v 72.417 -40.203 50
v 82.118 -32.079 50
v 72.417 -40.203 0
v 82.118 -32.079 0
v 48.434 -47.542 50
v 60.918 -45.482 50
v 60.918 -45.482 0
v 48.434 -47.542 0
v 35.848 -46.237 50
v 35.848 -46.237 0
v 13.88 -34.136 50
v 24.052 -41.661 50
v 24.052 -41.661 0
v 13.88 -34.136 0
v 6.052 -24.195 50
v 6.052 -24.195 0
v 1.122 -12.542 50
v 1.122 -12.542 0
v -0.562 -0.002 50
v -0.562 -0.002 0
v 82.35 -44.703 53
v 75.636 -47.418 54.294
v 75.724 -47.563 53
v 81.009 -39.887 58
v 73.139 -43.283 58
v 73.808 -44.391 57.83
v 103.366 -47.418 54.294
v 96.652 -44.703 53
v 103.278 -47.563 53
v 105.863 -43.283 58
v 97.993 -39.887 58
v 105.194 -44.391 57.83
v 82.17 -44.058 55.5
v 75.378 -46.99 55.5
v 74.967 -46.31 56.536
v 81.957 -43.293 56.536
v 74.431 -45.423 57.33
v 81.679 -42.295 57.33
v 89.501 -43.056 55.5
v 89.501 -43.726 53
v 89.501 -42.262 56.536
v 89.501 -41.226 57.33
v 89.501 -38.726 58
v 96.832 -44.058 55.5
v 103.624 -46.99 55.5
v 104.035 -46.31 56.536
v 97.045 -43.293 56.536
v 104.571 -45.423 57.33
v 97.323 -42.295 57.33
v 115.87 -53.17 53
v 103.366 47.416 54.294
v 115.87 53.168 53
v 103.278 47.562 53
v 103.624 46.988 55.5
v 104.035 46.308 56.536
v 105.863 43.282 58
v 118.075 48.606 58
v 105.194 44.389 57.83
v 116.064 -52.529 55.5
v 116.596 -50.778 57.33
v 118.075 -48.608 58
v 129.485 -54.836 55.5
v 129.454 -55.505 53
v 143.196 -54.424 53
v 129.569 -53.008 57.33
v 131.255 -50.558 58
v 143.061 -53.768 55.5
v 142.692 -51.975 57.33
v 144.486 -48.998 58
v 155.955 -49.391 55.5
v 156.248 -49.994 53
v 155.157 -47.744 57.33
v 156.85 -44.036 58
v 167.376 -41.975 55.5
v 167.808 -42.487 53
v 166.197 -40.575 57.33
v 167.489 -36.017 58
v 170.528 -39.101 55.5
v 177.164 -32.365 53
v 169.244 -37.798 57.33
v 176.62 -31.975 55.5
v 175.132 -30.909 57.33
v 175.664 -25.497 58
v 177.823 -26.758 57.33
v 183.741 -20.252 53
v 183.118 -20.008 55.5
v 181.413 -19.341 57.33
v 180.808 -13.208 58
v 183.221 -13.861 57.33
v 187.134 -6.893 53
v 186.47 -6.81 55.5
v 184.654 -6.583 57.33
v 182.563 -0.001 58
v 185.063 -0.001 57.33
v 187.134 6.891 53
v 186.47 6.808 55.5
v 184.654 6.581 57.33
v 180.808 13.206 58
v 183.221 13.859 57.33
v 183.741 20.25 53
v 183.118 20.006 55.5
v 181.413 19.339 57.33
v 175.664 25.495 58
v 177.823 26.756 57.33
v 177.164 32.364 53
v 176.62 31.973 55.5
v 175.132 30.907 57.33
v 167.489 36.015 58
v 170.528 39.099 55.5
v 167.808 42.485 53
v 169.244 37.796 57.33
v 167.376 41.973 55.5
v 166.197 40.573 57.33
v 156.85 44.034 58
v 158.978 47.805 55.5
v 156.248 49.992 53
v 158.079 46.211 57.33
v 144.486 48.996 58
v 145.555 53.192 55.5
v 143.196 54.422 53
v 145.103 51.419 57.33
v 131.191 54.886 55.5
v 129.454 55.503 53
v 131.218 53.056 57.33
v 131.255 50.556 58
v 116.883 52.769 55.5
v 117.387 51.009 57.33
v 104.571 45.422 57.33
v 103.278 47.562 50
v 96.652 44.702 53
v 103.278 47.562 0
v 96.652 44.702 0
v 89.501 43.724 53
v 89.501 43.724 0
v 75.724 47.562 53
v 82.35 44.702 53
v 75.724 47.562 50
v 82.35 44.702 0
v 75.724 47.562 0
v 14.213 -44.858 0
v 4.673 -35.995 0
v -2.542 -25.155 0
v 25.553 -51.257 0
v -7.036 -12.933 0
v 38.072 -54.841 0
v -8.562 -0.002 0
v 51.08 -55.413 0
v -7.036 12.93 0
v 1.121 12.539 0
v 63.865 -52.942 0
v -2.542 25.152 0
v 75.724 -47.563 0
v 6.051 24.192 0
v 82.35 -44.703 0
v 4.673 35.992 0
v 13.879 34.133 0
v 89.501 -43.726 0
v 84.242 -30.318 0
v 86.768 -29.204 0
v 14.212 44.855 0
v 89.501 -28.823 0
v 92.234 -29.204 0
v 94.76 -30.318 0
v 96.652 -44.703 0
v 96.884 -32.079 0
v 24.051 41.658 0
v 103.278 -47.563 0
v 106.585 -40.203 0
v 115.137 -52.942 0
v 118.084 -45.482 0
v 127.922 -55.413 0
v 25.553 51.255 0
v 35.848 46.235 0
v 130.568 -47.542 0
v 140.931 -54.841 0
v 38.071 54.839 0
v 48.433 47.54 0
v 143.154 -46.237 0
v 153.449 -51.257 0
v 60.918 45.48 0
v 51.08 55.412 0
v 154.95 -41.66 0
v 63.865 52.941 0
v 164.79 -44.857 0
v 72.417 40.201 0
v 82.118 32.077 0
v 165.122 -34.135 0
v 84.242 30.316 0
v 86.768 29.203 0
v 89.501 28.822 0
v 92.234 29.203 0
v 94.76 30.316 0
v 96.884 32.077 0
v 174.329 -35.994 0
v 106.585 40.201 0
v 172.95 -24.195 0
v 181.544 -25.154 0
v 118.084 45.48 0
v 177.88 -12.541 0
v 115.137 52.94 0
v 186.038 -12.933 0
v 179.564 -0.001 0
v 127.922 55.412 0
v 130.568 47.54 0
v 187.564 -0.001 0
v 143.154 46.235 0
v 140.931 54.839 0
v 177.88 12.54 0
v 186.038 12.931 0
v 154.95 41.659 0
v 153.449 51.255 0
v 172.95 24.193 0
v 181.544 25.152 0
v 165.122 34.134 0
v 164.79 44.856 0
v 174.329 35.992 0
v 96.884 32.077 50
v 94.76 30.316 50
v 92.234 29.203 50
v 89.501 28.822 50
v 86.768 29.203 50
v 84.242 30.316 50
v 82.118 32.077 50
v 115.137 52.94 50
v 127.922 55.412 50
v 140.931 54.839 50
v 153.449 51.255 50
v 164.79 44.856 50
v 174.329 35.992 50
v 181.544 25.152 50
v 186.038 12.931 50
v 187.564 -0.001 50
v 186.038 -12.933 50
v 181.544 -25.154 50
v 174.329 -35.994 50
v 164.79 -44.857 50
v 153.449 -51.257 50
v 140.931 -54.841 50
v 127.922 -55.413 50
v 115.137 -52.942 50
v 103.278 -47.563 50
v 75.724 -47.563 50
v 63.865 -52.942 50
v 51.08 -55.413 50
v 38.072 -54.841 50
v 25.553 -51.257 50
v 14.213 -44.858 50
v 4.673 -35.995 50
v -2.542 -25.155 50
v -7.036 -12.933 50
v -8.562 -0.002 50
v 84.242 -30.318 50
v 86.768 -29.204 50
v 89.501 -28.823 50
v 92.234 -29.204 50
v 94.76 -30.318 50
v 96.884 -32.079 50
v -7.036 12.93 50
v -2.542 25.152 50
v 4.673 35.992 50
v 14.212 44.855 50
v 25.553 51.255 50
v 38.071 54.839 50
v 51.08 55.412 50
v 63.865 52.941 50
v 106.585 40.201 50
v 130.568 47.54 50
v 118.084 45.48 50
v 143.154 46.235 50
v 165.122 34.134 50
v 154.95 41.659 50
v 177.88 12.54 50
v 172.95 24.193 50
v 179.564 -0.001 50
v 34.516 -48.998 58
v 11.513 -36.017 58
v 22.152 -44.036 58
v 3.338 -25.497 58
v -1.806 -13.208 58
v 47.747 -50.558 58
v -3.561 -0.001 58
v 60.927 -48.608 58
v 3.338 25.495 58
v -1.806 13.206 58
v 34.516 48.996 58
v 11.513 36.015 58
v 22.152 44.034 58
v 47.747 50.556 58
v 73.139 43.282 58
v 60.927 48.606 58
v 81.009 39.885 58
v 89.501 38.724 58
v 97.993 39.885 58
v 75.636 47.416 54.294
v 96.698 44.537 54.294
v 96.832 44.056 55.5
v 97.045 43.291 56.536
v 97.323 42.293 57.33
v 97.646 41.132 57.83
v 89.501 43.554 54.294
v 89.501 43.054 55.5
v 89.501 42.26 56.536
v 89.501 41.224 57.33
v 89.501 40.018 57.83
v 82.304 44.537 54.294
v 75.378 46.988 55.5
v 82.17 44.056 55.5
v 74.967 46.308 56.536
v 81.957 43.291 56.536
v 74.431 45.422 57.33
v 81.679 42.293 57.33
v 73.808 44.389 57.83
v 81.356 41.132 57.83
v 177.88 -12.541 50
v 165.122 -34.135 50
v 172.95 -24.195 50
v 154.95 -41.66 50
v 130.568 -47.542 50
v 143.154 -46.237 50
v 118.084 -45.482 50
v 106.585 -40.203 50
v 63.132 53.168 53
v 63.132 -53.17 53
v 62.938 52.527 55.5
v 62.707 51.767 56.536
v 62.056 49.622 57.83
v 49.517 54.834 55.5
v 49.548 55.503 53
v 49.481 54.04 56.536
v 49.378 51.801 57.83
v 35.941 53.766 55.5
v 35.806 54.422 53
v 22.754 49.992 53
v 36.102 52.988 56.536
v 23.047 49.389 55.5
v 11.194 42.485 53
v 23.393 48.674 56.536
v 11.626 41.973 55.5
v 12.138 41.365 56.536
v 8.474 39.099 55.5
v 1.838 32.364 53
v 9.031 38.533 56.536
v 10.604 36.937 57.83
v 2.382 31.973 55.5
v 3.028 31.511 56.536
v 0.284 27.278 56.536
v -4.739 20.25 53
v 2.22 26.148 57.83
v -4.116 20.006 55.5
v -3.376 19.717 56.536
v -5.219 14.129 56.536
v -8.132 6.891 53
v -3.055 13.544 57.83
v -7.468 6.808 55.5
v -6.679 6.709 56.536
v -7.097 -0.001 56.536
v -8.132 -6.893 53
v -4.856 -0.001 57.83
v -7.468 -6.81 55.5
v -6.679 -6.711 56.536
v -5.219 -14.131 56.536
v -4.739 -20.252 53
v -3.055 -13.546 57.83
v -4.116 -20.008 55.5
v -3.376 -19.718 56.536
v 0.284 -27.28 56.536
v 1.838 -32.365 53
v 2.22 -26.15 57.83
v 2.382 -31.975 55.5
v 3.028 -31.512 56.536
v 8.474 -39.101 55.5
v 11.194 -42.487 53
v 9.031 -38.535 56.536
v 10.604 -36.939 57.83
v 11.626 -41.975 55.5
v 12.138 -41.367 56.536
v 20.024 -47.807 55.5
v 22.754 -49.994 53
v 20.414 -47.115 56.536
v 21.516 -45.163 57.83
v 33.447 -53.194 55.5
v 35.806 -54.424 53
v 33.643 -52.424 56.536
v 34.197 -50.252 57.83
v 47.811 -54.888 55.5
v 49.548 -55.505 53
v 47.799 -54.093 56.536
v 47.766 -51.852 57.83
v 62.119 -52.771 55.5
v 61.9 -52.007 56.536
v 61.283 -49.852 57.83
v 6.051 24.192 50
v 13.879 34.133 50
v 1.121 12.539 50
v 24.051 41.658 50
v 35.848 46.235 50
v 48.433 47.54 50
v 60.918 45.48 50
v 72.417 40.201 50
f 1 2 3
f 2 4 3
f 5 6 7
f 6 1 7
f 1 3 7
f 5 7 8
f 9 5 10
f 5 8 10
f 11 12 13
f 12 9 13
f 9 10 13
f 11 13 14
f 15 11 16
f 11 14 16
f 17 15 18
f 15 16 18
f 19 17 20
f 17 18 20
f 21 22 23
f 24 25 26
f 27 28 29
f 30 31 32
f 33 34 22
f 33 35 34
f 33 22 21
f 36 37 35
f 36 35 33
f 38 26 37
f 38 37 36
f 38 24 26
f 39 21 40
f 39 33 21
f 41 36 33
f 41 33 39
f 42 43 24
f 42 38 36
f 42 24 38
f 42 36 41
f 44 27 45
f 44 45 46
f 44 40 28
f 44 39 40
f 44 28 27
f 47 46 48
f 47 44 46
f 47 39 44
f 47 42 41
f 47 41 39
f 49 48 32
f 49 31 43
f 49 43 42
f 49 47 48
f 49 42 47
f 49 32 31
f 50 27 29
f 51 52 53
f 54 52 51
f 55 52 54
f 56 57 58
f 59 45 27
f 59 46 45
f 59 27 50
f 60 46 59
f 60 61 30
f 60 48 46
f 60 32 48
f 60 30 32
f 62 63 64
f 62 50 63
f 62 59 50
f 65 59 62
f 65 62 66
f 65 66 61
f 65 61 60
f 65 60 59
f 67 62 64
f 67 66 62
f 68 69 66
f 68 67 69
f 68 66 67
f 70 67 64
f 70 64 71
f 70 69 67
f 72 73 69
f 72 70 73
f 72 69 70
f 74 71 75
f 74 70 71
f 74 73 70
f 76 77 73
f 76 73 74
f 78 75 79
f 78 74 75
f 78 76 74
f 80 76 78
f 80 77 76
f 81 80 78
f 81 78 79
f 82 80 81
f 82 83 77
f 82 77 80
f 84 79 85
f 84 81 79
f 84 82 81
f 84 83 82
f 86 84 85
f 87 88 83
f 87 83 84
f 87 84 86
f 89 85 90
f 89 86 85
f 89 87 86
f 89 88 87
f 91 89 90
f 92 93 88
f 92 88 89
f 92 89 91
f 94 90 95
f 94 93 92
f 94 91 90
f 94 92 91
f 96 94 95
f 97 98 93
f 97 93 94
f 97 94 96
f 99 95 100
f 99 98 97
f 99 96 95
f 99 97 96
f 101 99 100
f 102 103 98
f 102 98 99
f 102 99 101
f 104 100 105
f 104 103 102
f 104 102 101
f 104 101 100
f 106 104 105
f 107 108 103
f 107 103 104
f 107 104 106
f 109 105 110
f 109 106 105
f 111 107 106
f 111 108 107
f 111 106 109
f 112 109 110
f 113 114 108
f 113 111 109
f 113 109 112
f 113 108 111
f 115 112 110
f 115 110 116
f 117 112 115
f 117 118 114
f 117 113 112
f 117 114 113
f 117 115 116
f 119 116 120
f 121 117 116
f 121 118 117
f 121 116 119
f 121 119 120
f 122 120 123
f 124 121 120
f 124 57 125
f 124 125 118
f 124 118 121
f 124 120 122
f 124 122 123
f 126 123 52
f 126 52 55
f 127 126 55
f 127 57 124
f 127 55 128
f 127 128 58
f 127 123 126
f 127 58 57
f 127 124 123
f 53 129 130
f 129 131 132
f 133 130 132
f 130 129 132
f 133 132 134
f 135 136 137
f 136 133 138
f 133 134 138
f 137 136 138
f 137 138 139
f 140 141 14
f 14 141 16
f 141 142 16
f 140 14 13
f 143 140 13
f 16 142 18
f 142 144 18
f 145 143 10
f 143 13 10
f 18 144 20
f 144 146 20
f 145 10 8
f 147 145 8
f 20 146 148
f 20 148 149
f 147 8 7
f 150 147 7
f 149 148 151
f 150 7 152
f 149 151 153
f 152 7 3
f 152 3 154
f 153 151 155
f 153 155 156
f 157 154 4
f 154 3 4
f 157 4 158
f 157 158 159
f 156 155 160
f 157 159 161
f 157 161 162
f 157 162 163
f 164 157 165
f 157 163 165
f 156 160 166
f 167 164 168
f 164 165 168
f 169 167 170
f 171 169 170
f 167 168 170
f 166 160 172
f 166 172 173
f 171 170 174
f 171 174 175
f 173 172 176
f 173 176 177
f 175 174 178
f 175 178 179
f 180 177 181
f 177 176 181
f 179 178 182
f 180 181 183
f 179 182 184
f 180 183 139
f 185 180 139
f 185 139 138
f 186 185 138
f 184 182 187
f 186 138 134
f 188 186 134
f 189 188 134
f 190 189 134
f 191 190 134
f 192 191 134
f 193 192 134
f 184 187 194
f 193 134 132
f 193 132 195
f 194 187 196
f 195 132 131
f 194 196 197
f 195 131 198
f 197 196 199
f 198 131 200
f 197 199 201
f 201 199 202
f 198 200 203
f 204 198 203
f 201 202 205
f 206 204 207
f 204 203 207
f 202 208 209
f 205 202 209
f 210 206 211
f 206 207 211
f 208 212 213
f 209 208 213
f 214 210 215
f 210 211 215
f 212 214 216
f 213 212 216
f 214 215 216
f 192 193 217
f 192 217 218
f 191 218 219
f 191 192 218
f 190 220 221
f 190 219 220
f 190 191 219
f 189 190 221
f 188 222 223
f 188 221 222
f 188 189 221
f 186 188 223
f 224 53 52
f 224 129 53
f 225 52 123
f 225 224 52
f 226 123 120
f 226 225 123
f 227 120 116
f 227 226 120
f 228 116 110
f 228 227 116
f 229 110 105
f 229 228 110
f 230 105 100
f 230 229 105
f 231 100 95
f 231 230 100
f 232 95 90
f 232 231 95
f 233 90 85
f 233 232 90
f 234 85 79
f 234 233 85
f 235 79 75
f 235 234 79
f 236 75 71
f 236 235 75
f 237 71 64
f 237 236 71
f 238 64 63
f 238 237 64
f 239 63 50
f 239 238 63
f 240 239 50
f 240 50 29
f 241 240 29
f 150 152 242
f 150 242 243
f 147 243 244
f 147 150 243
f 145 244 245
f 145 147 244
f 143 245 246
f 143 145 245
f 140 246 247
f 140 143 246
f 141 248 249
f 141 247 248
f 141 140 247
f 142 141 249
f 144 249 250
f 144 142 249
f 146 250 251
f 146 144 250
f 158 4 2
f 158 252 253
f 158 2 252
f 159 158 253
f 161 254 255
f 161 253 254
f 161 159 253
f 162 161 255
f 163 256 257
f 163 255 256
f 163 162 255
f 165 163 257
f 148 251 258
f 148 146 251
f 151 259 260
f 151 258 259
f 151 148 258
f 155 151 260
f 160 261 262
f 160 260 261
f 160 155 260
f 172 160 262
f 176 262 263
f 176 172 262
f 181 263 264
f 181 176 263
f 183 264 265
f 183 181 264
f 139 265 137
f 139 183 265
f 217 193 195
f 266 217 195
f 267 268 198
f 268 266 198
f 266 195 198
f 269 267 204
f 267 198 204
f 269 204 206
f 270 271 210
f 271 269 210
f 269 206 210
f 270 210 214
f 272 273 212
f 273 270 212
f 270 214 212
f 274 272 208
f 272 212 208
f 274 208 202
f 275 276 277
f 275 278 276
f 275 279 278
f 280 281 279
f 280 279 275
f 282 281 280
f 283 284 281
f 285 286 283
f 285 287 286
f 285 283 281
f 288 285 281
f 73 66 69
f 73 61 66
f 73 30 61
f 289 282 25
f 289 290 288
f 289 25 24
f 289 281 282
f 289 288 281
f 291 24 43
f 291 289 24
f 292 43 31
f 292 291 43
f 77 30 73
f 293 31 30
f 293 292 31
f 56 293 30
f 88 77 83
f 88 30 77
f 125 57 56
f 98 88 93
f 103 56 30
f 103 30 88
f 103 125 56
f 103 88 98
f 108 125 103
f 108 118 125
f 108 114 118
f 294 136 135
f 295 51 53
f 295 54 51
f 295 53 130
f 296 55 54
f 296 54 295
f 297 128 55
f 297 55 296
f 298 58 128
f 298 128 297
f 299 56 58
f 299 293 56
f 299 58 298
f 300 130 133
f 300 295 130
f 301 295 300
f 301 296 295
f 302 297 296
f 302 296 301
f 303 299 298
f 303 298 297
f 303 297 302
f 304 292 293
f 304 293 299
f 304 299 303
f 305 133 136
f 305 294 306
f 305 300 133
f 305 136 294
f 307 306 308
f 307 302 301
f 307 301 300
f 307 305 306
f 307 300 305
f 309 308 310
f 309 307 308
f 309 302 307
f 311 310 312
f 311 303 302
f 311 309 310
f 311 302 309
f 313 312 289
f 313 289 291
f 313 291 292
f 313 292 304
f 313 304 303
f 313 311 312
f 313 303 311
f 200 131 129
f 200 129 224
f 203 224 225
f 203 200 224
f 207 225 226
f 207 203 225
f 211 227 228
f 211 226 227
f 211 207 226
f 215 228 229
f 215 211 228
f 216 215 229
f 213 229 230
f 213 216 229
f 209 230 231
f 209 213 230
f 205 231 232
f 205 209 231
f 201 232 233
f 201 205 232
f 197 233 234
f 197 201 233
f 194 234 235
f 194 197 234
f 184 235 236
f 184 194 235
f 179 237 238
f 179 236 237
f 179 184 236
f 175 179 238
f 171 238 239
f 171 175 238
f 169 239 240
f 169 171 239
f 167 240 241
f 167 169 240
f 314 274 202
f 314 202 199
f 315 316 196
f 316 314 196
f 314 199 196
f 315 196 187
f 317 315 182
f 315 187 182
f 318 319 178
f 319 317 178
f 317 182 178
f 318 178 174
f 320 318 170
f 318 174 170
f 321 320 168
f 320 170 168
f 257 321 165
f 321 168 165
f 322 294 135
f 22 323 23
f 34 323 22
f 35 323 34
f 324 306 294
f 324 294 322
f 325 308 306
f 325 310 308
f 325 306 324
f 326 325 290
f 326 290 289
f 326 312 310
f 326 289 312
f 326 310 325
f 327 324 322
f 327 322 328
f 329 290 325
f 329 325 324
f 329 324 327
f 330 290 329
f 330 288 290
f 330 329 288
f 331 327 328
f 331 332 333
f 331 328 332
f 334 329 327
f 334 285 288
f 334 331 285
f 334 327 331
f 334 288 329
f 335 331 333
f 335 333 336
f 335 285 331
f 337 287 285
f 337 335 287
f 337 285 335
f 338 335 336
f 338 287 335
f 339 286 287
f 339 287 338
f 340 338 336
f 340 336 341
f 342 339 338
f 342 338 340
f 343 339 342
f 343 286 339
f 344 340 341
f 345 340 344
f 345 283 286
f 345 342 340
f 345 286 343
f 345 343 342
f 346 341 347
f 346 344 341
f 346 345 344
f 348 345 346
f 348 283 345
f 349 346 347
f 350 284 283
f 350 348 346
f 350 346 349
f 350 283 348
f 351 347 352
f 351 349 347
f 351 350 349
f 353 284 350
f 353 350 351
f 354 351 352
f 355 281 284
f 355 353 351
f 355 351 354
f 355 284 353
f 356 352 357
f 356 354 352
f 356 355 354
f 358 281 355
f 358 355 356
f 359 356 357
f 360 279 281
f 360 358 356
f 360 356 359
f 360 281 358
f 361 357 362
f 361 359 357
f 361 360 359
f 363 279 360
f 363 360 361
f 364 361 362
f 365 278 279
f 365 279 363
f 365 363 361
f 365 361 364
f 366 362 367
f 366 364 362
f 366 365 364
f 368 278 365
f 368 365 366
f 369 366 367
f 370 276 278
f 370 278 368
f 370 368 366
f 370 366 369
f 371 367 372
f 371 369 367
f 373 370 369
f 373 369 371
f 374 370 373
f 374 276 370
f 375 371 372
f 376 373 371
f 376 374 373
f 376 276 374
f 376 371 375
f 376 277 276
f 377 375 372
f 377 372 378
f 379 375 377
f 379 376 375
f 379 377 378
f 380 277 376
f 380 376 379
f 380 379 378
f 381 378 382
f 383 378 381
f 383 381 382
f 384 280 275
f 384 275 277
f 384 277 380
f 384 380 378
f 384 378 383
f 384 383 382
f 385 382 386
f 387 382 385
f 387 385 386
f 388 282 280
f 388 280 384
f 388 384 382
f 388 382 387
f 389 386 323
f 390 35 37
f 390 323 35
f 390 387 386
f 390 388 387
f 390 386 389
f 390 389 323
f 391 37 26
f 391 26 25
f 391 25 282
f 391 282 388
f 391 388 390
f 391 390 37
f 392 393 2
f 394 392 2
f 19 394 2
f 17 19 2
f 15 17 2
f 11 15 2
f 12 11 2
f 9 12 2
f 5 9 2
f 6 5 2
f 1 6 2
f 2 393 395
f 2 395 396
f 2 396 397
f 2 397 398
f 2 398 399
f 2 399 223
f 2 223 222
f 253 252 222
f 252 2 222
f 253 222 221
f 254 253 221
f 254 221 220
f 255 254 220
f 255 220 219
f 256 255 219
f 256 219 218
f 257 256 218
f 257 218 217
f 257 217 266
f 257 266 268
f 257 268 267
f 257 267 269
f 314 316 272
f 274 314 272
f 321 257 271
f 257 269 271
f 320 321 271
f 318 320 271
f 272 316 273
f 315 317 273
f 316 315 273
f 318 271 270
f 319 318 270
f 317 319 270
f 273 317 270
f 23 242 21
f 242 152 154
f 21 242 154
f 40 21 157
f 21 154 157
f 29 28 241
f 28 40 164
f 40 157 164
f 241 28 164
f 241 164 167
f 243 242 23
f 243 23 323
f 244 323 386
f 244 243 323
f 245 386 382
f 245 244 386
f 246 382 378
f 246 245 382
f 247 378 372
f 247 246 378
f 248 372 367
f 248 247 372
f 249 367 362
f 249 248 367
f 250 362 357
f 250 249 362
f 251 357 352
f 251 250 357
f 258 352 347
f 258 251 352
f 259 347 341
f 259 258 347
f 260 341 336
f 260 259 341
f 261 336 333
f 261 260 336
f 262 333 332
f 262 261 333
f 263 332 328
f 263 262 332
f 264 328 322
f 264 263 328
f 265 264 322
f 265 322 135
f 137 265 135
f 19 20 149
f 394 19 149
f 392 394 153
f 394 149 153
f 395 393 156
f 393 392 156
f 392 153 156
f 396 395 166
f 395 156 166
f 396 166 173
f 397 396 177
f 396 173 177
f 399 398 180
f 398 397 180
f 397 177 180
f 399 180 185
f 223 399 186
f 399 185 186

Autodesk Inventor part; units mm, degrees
ref_plane "YZ Plane" through (0, 0, 0) normal (1, 0, 0) x (0, 1, 0)
ref_plane "XZ Plane" through (0, 0, 0) normal (0, 1, 0) x (-1, 0, 0)
ref_plane "XY Plane" through (0, 0, 0) normal (0, 0, 1) x (1, 0, 0)
sketch "Sketch1" plane through (0, 0, 0) normal (0, 0, 1) x (1, 0, 0)
  line L0 (-11.999, -0.0009) -> (209.001, -0.0009) construction
  circle A0 centre (47.001, -0.0009) radius 42.5 construction
  circle A1 centre (132.001, -0.0009) radius 42.5 construction
  circle A2 centre (47.001, -0.0009) radius 47.5625 construction
  circle A3 centre (132.001, -0.0009) radius 47.5625 construction
  arc A4 (82.1177, 32.0773) -> (-0.5615, -0.0019) centre (47.001, -0.0009) ccw
  arc A5 (179.5635, -0.0009) -> (96.8843, 32.0773) centre (132.001, -0.0009) ccw
  arc A6 (-0.5615, -0.0019) -> (82.1177, -32.079) centre (47.001, -0.0009) ccw
  arc A7 (96.8843, -32.079) -> (179.5635, -0.0009) centre (132.001, -0.0009) ccw
  arc A8 (75.7238, 47.5616) -> (-8.5615, -0.0015) centre (47.001, -0.0009) ccw
  arc A9 (187.5635, -0.0009) -> (103.2782, 47.5616) centre (132.001, -0.0009) ccw
  line L1 (47.001, 47.5616) -> (132.001, 47.5616) construction
  arc A10 (75.7238, 47.5616) -> (103.2782, 47.5616) centre (89.501, 70.3754) ccw
  arc A11 (-8.5615, -0.0015) -> (75.7238, -47.5634) centre (47.001, -0.0009) ccw
  arc A12 (103.2782, -47.5634) -> (187.5635, -0.0009) centre (132.001, -0.0009) ccw
  arc A13 (103.2782, -47.5634) -> (75.7238, -47.5634) centre (89.501, -70.3772) ccw
  arc A14 (82.1177, 32.0773) -> (96.8843, 32.0773) centre (89.501, 38.8217) ccw
  line L2 (82.1177, 32.0773) -> (96.8843, 32.0773) construction
  arc A15 (96.8843, -32.079) -> (82.1177, -32.079) centre (89.501, -38.8234) ccw
  point P0 (89.501, 21.3519)
  point P1 (46.9513, 55.5616)
  point P2 (132.0501, 55.5616)
  dimension "d5" = 221
  dimension "d6" = 85
  dimension "d7" = 85
  dimension "d8" = 85
  dimension "d9" = 95.125
  dimension "d10" = 95.125
  dimension "d12" = 8
  dimension "d20" = 10
extrude "Extrusion1" add sketch "Sketch1" along normal blind 50
sketch "Sketch2" plane through (0, 0, 50) normal (0, 0, 1) x (1, 0, 0)
  arc A0 (75.7238, 47.5616) -> (75.7238, -47.5634) centre (47.001, -0.0009) ccw projected
  arc A1 (75.7238, 47.5616) -> (103.2782, 47.5616) centre (89.501, 70.3754) ccw projected
  arc A2 (103.2782, -47.5634) -> (103.2782, 47.5616) centre (132.001, -0.0009) ccw projected
  arc A3 (103.2782, -47.5634) -> (75.7238, -47.5634) centre (89.501, -70.3772) ccw projected
  point P0 (0, 0)
extrude "Extrusion2" add sketch "Sketch2" along normal blind 8
fillet "Fillet1" radius 5 4 edges at (89.501, -43.7261, 58) (187.5635, -0.0009, 58) (89.501, 43.7243, 58) (-8.5615, -0.0009, 58)
sketch "Sketch3" plane through (0, 0, 0) normal (0, 0, -1) x (-1, 0, 0)
  line L0 (8.5615, -0.0009) -> (-187.5635, -0.0009) construction
  arc A0 (-103.2782, 47.5616) -> (-103.2782, -47.5634) centre (-132.001, -0.0009) ccw construction
  arc A1 (-75.7238, -47.5634) -> (-75.7238, 47.5616) centre (-47.001, -0.0009) ccw construction
  point P0 (0, 0)
  dimension "d27" = 196.125
equation "\"d7\" = d6"
equation "\"d8\" = d6"
equation "\"d10\" = d9"
properties part number "Gehaeuse_V2"
